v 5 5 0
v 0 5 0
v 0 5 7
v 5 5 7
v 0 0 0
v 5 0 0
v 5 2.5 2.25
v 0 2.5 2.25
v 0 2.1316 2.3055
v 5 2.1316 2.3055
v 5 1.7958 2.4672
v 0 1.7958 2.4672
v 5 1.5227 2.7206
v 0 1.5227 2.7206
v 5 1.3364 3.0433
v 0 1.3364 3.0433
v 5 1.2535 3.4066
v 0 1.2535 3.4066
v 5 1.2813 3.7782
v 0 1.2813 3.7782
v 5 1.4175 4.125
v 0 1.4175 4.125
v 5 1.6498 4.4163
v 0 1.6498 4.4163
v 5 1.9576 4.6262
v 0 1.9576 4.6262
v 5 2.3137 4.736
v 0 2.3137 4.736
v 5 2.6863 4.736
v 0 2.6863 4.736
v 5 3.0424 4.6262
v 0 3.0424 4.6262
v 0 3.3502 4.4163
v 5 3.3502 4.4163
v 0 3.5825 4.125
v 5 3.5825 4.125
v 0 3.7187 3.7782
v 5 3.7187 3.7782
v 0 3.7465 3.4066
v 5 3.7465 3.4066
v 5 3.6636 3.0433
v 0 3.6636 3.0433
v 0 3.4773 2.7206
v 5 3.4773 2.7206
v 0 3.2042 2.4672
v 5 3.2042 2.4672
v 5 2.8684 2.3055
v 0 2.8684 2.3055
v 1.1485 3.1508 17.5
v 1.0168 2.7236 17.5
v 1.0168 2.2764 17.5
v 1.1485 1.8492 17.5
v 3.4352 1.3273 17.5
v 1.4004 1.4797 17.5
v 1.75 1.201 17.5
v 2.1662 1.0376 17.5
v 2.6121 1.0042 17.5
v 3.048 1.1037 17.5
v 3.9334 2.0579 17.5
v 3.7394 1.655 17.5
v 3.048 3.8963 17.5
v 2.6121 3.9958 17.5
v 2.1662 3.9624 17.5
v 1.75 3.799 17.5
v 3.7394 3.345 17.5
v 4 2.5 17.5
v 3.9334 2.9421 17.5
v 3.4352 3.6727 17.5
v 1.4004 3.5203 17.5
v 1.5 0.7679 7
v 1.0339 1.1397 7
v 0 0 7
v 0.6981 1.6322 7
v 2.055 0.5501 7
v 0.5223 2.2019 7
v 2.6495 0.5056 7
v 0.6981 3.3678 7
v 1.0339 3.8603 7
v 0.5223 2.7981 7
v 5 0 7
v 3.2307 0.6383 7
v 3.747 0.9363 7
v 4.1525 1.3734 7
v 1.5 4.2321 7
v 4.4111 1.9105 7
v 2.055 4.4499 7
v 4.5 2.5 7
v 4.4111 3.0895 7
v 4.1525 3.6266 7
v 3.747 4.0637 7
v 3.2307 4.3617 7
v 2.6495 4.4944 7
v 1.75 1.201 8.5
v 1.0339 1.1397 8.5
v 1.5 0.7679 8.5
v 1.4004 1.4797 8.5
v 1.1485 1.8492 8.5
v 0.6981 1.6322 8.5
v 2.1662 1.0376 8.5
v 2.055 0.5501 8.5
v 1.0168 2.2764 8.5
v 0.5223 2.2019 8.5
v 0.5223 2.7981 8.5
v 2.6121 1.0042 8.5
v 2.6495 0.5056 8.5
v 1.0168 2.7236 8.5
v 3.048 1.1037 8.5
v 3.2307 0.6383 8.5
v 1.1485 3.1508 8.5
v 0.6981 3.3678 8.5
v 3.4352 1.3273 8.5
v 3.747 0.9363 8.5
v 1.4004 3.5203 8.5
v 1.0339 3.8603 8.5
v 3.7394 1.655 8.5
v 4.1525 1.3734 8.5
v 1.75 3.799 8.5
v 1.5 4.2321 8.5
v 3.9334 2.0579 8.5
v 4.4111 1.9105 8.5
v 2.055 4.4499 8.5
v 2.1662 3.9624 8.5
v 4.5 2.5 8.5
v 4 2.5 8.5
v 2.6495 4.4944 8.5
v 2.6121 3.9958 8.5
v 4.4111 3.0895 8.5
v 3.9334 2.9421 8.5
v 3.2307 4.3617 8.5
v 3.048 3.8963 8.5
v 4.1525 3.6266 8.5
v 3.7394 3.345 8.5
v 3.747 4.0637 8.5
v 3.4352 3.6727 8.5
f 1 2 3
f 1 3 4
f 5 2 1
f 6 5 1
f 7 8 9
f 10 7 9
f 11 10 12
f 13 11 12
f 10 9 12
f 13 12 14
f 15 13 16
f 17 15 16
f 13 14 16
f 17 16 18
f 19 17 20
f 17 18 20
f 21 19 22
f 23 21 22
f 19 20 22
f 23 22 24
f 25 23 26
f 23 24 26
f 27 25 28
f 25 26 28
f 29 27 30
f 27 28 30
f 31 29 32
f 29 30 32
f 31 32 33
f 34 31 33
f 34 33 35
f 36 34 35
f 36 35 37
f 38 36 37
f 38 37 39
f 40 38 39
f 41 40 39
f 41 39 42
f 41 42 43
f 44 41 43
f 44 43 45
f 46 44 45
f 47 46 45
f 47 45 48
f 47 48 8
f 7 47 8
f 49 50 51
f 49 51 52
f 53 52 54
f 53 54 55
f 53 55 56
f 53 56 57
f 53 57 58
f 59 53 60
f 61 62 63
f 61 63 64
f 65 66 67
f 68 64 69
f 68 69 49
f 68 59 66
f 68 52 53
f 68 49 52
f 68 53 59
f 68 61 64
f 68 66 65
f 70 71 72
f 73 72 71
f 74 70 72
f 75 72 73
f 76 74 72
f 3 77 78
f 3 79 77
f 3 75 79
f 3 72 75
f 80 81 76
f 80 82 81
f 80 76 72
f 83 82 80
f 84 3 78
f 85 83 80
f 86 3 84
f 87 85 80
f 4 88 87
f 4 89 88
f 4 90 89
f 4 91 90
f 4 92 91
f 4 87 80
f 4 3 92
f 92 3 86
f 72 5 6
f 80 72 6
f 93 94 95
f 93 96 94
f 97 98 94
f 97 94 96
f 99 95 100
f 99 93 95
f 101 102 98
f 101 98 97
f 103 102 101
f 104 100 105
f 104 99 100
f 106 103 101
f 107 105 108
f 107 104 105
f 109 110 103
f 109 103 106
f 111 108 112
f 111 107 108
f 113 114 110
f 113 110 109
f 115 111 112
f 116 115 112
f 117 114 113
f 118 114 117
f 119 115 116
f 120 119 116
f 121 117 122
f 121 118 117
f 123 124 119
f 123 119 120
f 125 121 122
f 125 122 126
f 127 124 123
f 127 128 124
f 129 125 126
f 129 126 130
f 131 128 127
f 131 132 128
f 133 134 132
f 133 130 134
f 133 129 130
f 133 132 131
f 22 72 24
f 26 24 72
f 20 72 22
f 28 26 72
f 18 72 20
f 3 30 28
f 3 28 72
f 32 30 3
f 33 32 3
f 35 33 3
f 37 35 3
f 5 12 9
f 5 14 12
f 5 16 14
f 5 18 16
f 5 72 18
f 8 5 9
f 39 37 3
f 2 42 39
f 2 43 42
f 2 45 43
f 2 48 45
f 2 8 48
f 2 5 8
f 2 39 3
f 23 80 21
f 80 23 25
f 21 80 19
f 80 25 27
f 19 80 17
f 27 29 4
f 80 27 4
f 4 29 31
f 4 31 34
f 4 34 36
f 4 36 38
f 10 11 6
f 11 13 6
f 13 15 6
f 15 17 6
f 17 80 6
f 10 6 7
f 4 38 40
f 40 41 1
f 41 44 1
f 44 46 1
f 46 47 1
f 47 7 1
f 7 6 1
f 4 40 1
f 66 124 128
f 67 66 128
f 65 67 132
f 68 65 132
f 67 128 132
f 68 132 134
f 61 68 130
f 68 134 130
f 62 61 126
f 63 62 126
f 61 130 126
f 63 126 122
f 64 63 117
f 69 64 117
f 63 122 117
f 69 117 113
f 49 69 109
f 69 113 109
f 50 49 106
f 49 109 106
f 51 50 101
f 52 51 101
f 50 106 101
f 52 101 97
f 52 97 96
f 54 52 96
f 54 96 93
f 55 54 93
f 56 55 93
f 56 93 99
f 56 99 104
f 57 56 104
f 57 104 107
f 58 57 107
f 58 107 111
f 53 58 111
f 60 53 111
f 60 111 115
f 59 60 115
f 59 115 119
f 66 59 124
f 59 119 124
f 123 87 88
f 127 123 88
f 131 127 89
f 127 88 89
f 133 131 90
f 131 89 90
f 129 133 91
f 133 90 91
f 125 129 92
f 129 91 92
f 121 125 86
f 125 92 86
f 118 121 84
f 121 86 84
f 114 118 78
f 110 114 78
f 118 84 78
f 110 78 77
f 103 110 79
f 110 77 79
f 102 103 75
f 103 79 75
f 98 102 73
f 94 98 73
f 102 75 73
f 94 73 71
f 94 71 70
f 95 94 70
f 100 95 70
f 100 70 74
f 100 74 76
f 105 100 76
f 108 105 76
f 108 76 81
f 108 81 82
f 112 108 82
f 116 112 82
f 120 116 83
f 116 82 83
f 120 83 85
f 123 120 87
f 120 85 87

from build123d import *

# Parameters (mm, degrees)
SKETCH_1_W             = 5
SKETCH_1_H             = 5
EXTRUDE_1_DEPTH        = 7
SKETCH_2_R             = 2
EXTRUDE_2_DEPTH        = 1.5
SKETCH_3_R             = 1.5
EXTRUDE_3_DEPTH        = 9
HOLE_WIZARD_M3_2_D     = 2.5
HOLE_WIZARD_M3_2_DEPTH = 7.5
HOLE_WIZARD_M3_2_TIP   = 0.751075774


with BuildPart() as part:
    # 草图1 → 凸台-拉伸1 (new body)
    with BuildSketch(Plane.XY):
        with Locations((2.5, 2.5)):
            Rectangle(SKETCH_1_W, SKETCH_1_H)
    extrude(amount=EXTRUDE_1_DEPTH)

    # 草图2 → 凸台-拉伸2 (add)
    with BuildSketch(Plane.XY.offset(7)):
        with Locations((2.5, 2.5)):
            Circle(SKETCH_2_R)
    extrude(amount=EXTRUDE_2_DEPTH)

    # 草图3 → 凸台-拉伸3 (add)
    with BuildSketch(Plane.XY.offset(8.5)):
        with Locations((2.5, 2.5)):
            Circle(SKETCH_3_R)
    extrude(amount=EXTRUDE_3_DEPTH)

    # M3 螺纹孔2
    with Locations(Plane(origin=(5, 2.5, 3.5), x_dir=(0, 0, 1), z_dir=(1, 0, 0))):
        with Locations((0, 0)):
            Hole(HOLE_WIZARD_M3_2_D / 2, depth=HOLE_WIZARD_M3_2_DEPTH)
            with Locations((0, 0, -(HOLE_WIZARD_M3_2_DEPTH + HOLE_WIZARD_M3_2_TIP / 2))):  # 118° drill point
                Cone(0, HOLE_WIZARD_M3_2_D / 2, HOLE_WIZARD_M3_2_TIP, mode=Mode.SUBTRACT)


solid = part.part
